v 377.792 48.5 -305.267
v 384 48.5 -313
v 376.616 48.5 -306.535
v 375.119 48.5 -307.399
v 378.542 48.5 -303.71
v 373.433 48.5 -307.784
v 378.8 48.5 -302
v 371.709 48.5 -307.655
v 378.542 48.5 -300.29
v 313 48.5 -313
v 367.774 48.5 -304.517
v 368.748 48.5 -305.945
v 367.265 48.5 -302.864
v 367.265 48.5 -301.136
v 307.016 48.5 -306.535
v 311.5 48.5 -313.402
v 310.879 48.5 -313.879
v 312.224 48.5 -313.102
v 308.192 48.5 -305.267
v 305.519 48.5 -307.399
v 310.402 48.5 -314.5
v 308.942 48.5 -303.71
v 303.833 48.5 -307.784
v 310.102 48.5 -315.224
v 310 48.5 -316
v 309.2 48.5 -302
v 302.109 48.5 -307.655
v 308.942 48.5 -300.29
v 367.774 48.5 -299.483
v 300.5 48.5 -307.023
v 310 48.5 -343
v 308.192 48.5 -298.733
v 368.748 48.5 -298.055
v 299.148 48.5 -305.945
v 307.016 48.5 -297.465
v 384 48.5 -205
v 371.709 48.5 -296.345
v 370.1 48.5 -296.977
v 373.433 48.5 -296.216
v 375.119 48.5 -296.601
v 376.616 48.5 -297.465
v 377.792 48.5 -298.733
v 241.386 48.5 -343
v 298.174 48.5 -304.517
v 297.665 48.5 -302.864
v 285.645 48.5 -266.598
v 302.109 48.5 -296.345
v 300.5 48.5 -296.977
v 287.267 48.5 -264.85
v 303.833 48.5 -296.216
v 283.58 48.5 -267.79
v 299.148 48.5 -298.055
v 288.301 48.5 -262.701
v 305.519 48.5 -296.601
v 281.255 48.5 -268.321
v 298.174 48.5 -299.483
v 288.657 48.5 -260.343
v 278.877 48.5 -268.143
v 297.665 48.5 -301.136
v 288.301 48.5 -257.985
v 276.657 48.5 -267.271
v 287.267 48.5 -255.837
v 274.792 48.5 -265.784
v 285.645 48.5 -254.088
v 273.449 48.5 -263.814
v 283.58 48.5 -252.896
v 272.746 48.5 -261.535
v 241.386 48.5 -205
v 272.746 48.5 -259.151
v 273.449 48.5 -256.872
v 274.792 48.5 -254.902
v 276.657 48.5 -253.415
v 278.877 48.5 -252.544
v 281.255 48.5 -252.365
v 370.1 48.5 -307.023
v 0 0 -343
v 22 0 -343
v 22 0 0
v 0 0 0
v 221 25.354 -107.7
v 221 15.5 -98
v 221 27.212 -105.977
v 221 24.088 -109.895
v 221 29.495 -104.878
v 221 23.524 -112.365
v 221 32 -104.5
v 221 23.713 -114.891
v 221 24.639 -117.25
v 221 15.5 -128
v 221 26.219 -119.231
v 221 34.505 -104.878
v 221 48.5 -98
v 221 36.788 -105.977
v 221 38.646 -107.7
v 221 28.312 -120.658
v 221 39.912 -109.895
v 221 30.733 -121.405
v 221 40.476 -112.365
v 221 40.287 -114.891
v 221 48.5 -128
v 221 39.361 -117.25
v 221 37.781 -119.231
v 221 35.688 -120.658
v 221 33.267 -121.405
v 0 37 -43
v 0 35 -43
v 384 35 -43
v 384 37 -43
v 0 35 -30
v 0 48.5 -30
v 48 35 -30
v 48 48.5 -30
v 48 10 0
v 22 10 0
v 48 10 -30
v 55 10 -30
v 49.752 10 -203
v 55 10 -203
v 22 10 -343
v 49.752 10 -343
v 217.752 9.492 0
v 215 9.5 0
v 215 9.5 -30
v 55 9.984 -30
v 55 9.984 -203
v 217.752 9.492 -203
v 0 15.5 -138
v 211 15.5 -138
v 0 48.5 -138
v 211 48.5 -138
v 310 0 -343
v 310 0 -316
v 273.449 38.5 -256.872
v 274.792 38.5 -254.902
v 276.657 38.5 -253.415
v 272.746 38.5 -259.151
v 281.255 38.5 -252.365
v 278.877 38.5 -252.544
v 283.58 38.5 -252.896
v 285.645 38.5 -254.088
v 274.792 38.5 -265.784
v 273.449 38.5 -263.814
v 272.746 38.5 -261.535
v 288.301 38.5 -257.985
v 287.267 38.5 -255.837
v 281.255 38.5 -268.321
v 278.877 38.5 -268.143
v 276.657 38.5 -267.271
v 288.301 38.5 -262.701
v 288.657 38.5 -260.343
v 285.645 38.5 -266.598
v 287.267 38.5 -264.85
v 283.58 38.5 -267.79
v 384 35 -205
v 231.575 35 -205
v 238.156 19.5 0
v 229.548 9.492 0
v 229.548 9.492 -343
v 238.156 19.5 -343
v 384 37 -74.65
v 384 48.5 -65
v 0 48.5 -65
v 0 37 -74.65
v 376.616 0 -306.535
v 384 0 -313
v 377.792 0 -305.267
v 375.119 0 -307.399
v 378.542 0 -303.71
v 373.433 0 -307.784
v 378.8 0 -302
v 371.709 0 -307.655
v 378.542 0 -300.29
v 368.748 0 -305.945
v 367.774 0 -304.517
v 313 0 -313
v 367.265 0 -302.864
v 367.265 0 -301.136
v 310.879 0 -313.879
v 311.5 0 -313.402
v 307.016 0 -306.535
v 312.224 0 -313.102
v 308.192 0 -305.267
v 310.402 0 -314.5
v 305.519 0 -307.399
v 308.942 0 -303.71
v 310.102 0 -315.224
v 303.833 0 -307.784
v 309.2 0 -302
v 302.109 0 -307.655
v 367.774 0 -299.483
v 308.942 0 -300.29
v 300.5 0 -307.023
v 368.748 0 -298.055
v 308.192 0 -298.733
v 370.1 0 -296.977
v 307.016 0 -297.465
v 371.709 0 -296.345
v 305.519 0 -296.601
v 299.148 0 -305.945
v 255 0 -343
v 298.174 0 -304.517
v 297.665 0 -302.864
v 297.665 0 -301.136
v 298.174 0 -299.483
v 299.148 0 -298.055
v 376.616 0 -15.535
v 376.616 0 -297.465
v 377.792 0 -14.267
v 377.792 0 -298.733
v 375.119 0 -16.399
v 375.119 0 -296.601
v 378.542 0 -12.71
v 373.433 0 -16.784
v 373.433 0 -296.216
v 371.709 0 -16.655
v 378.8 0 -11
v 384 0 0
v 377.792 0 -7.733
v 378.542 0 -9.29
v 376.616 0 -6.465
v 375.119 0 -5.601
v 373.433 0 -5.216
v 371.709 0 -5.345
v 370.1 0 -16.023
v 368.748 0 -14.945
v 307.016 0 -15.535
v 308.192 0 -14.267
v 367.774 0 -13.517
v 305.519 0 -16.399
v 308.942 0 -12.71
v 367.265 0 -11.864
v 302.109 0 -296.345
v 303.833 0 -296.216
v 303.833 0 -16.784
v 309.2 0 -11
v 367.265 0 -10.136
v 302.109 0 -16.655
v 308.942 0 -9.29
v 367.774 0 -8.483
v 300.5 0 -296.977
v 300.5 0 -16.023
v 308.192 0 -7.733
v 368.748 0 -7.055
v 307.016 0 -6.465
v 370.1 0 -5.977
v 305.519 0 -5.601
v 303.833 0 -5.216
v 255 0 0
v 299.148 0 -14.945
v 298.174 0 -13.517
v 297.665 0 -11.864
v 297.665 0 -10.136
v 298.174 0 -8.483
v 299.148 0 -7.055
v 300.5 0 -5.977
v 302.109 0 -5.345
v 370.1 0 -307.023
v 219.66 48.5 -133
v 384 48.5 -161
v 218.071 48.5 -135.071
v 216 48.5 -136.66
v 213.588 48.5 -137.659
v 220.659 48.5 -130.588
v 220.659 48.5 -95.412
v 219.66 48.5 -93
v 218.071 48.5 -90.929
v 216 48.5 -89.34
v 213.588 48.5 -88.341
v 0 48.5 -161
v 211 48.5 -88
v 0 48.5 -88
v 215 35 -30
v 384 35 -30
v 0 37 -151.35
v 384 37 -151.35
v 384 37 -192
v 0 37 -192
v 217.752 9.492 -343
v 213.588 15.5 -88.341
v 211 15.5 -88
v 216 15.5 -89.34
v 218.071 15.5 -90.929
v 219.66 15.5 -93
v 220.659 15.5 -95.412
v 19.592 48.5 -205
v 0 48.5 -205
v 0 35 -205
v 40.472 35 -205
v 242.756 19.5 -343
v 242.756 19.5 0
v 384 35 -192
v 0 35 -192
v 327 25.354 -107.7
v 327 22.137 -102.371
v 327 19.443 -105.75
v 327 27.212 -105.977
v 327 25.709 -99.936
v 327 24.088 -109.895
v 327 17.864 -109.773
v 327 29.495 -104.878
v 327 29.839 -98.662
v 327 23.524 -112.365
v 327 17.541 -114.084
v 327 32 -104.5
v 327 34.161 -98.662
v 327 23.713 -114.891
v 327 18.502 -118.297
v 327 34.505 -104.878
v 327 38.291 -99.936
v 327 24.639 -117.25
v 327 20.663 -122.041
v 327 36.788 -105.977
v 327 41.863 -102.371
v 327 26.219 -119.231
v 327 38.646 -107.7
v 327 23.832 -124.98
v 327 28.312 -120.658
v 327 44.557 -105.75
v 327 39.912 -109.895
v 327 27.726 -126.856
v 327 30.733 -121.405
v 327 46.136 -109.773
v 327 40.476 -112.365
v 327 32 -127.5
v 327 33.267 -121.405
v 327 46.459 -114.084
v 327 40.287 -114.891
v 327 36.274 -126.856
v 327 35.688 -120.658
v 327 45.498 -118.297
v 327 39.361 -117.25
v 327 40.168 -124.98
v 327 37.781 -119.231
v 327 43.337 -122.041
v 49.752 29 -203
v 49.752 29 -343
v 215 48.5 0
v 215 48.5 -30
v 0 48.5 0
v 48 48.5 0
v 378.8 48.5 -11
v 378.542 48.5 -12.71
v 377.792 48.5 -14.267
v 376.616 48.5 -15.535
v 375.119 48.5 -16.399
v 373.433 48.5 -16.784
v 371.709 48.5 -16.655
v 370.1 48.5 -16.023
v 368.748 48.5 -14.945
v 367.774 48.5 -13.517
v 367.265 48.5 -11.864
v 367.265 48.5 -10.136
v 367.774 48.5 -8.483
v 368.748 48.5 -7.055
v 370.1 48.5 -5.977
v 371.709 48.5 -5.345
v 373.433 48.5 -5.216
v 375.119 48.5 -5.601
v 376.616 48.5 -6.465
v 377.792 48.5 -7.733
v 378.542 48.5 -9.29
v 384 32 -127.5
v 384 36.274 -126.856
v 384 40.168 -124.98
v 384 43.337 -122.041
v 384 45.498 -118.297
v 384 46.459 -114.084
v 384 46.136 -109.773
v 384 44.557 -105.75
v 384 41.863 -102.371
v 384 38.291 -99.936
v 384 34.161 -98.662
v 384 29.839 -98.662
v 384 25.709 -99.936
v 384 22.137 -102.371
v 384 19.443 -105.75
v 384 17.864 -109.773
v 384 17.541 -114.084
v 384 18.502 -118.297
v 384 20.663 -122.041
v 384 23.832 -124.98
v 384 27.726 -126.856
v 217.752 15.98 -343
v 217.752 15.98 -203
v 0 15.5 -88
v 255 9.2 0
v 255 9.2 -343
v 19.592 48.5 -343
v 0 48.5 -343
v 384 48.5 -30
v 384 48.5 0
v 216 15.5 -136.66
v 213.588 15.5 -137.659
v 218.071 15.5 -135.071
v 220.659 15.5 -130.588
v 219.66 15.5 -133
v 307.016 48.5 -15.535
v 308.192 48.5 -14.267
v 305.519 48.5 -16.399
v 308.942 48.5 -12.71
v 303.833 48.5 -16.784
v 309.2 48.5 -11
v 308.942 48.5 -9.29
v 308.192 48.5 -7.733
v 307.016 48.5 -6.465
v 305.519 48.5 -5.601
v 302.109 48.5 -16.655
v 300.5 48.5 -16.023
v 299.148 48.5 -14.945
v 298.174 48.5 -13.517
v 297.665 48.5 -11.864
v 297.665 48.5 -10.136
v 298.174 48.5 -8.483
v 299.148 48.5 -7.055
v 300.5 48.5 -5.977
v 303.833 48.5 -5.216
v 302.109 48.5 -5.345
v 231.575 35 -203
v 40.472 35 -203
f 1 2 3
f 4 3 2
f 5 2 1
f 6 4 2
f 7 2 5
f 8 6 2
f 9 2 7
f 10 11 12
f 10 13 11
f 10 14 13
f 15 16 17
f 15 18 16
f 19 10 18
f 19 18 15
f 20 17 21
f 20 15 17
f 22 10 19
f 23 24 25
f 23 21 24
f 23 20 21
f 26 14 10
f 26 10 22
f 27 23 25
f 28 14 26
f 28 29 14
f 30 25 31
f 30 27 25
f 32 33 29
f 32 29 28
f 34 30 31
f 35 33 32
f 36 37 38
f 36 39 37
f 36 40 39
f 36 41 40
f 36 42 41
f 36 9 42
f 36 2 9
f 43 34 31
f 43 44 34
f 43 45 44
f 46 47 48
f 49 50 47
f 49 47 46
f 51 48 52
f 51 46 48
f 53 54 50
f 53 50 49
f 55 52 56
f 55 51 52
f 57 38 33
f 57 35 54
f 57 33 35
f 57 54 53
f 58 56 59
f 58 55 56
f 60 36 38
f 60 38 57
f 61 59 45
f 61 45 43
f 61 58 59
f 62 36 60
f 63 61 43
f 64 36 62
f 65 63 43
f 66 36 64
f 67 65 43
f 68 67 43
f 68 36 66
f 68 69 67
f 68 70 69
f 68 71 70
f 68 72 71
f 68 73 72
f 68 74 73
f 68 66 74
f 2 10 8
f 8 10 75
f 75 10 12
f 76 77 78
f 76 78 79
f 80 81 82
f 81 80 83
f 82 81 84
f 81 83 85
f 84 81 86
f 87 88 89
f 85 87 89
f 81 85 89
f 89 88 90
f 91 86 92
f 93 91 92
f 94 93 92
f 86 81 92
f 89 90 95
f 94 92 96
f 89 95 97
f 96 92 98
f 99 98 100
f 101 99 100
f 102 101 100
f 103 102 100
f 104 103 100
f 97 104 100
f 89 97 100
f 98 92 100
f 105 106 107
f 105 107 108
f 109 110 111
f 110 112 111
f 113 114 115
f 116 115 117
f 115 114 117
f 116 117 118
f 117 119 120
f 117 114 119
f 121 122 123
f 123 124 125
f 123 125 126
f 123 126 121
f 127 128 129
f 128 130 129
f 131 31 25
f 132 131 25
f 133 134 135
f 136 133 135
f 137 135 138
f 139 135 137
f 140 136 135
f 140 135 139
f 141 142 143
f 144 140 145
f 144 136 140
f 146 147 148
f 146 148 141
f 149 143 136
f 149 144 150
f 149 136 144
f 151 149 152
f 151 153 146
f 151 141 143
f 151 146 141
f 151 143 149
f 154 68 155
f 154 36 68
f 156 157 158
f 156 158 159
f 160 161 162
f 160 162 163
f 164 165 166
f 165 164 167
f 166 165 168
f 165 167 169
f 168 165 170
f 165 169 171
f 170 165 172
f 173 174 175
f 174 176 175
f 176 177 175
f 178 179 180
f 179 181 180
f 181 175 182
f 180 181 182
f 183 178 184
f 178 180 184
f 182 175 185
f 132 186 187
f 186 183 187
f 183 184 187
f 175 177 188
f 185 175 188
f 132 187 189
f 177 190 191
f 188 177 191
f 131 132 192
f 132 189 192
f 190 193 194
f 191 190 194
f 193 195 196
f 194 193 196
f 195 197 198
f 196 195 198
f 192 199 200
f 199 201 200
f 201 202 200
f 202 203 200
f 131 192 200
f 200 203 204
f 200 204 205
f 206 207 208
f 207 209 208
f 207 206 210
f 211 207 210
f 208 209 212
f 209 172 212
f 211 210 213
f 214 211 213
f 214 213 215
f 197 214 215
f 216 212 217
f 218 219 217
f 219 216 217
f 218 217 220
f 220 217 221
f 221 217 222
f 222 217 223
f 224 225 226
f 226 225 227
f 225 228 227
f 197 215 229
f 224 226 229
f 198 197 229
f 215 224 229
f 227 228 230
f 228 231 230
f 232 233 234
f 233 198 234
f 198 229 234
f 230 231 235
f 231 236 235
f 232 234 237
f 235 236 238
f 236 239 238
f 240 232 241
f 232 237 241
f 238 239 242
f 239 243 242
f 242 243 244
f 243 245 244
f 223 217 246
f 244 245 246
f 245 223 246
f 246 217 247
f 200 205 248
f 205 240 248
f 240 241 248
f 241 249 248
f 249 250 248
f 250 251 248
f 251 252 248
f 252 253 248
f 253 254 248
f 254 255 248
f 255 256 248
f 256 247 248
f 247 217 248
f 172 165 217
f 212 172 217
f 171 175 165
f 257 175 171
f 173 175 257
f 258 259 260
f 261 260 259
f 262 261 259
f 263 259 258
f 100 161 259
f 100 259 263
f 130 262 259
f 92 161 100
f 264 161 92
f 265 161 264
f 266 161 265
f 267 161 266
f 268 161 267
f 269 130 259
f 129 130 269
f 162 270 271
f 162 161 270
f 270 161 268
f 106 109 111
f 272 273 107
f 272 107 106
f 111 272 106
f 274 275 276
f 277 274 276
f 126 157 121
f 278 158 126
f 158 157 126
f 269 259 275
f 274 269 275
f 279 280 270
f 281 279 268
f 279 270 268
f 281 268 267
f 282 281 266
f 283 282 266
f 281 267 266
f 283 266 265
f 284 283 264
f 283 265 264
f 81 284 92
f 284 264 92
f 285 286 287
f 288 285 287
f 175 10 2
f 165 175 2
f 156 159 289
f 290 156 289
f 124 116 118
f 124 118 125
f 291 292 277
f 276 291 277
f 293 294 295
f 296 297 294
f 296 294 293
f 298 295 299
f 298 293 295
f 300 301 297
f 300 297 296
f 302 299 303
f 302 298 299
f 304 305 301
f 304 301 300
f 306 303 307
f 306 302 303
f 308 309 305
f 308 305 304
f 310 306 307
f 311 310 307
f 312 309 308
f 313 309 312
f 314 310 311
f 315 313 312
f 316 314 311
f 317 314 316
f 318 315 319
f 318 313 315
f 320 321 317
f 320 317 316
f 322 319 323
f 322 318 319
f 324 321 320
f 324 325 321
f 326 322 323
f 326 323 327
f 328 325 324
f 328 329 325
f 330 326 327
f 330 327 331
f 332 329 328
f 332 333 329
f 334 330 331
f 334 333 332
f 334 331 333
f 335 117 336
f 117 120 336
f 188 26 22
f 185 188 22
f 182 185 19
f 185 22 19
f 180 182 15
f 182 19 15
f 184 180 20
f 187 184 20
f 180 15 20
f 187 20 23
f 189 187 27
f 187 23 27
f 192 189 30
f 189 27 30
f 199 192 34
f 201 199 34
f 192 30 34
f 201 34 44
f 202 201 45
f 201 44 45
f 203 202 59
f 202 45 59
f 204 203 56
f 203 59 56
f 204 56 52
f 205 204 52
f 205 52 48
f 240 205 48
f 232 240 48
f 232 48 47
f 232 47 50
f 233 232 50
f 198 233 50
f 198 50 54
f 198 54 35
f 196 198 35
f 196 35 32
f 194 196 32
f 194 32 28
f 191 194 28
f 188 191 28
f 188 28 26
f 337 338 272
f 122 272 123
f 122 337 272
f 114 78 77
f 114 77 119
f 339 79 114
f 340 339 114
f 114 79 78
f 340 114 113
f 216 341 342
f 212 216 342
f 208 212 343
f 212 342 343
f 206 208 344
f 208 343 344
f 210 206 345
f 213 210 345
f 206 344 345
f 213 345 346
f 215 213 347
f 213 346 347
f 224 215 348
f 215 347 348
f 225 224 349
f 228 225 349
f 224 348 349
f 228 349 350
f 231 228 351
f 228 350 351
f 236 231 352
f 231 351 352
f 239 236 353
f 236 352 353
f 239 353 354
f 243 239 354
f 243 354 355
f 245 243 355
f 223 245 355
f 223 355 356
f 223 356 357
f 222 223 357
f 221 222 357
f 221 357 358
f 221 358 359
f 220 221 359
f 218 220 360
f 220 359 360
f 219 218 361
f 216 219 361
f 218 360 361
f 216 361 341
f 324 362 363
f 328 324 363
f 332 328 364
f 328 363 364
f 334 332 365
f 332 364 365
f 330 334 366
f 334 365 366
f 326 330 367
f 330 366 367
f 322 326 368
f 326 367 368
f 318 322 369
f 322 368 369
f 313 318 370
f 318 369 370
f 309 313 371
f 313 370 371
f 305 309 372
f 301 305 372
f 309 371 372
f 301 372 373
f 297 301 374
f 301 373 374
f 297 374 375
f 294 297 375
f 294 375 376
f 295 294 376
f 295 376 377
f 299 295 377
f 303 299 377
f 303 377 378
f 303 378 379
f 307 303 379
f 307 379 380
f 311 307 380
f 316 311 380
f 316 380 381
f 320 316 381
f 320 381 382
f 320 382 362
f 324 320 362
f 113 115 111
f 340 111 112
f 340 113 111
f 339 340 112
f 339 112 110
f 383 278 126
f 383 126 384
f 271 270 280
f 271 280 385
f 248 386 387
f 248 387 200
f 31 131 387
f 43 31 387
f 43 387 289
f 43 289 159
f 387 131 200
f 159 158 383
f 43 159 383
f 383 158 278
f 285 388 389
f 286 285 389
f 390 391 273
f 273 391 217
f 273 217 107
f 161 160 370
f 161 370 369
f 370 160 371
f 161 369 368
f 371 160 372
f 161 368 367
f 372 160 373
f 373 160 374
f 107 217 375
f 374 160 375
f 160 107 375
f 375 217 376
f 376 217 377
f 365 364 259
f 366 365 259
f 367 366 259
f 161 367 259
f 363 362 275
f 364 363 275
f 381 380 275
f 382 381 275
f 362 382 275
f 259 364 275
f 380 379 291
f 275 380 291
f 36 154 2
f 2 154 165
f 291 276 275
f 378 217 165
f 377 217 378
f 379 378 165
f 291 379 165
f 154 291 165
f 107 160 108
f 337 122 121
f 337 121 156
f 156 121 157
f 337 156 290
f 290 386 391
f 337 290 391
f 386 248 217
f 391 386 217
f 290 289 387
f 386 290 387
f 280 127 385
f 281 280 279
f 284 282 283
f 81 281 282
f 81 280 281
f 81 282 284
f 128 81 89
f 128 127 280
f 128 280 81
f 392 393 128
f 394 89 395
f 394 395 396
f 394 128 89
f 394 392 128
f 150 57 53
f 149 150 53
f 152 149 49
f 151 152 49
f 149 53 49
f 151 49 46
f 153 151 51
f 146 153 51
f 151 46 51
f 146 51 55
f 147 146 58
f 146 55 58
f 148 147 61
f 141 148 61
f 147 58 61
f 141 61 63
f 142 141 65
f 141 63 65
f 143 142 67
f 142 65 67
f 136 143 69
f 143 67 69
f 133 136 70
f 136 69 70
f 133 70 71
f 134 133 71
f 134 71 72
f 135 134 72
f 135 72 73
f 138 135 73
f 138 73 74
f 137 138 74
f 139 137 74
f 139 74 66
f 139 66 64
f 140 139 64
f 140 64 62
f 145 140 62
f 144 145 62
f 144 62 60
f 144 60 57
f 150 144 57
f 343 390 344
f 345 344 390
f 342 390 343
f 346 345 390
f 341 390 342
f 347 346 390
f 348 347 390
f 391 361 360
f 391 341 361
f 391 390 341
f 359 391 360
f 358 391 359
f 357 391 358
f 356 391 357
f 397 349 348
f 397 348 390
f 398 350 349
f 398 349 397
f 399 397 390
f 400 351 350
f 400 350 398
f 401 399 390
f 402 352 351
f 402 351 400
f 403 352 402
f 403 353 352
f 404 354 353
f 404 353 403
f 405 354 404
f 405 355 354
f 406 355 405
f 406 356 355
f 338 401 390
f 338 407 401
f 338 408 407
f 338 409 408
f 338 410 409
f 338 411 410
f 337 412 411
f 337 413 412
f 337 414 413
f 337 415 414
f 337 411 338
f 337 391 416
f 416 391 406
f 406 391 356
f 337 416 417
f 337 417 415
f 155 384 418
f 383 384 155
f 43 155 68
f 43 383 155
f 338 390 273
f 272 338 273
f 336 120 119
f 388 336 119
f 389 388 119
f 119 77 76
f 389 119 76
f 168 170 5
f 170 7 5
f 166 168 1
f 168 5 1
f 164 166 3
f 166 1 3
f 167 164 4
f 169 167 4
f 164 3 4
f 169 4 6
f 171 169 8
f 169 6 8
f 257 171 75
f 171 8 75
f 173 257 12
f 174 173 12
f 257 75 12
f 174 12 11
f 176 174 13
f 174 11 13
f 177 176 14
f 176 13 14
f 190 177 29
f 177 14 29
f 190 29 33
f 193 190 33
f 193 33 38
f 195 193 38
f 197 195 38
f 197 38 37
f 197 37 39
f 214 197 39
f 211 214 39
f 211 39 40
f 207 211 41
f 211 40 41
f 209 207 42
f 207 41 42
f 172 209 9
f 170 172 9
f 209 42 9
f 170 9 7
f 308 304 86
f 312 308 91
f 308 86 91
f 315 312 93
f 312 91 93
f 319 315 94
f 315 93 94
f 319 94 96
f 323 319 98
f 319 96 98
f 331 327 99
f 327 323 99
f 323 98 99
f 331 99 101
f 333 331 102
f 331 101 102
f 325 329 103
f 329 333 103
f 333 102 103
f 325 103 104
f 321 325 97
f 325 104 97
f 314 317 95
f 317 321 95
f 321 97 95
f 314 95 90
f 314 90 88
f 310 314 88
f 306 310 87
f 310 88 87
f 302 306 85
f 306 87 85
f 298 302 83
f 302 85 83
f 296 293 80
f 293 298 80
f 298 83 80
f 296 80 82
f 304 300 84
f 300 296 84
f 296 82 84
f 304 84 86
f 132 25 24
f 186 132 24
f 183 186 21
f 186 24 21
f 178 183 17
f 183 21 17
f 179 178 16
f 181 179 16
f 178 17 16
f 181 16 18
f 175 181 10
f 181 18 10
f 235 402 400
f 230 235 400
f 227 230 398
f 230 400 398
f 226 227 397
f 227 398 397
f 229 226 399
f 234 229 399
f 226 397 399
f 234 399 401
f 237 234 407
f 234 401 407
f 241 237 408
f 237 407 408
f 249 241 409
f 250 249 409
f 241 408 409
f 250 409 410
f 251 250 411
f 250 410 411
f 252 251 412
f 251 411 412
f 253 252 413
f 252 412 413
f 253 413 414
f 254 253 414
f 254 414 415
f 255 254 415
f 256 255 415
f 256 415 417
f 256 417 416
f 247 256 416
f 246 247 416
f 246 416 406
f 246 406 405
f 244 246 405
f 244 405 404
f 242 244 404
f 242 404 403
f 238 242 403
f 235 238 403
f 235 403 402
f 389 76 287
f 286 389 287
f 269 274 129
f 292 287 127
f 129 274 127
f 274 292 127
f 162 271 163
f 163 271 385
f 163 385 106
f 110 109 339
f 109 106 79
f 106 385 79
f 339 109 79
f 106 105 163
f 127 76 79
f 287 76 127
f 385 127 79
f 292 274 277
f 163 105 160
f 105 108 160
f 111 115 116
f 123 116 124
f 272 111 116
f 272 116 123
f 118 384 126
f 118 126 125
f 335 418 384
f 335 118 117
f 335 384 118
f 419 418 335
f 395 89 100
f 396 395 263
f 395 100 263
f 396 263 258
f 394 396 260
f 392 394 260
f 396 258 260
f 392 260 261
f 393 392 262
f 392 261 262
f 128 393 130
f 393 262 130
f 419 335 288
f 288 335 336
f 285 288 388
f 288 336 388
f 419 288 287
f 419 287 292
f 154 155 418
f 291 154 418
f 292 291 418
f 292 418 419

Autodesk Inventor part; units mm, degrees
ref_plane "YZ Plane" through (0, 0, 0) normal (1, 0, 0) x (0, 1, 0)
ref_plane "XZ Plane" through (0, 0, 0) normal (0, 1, 0) x (-1, 0, 0)
ref_plane "XY Plane" through (0, 0, 0) normal (0, 0, 1) x (1, 0, 0)
sketch "Sketch1" plane through (0, 0, 0) normal (0, 1, 0) x (-1, 0, 0)
  line L0 (0, 0) -> (-384, 0)
  line L1 (-384, 0) -> (-384, -343)
  line L2 (-384, -343) -> (0, -343)
  line L3 (0, -343) -> (0, 0)
  dimension "d0" = 384
  dimension "d1" = 343
extrude "Extrusion1" add sketch "Sketch1" along normal blind 48.5
sketch "Sketch3" plane through (384, 0, 0) normal (1, 0, 0) x (0, 0, -1)
  line L0 (0, 0) -> (343, 0) projected
  line L1 (0, 0) -> (0, 48.5) projected
  line L2 (343, 0) -> (343, 48.5) projected
  line L3 (30, 48.5) -> (65, 48.5)
  line L4 (30, 48.5) -> (30, 37)
  line L5 (65, 48.5) -> (74.6496, 37)
  line L6 (43, 37) -> (74.6496, 37)
  line L7 (30, 37) -> (30, 35)
  line L8 (30, 35) -> (43, 35)
  line L9 (43, 35) -> (43, 37)
  dimension "d23" = 35
  dimension "d37" = 2
  dimension "d38" = 13
extrude "Extrusion2" cut sketch "Sketch3" against normal through all
sketch "Sketch7" plane through (384, 0, 0) normal (1, 0, 0) x (0, 0, -1)
  line L0 (65, 48.5) -> (343, 48.5) projected
  line L1 (65, 48.5) -> (161, 48.5)
  line L2 (161, 48.5) -> (174.2196, 48.5) construction
  line L3 (161, 48.5) -> (205, 48.5)
  line L4 (0, 0) -> (343, 0) projected
  line L5 (151.3504, 37) -> (192, 37)
  line L6 (205, 37) -> (205, 48.5)
  line L7 (161, 48.5) -> (151.3504, 37)
  line L8 (161, 48.5) -> (183.0653, 48.5) construction
  line L9 (205, 37) -> (205, 35)
  line L10 (205, 35) -> (192, 35)
  line L11 (192, 35) -> (192, 37)
  dimension "d27" = 96
  dimension "d29" = 44
  dimension "d32" = 130
extrude "Extrusion3" cut sketch "Sketch7" against normal through all
sketch "Sketch8" plane through (0, 48.5, 0) normal (0, 1, 0) x (1, 0, 0)
  line L0 (310, 343) -> (310, 316)
  line L1 (313, 313) -> (384, 313)
  line L2 (384, 0) -> (384, 343) projected
  line L3 (384, 313) -> (384, 343)
  line L4 (384, 343) -> (310, 343)
  line L5 (384, 343) -> (0, 343) projected
  arc A0 (310, 316) -> (313, 313) centre (313, 316) ccw
  point P0 (0, 0)
  point P1 (310, 313)
  dimension "d43" = 30
  dimension "d46" = 3
extrude "Extrusion4" cut sketch "Sketch8" against normal through all
sketch "Sketch12" plane through (0, 48.5, 0) normal (0, 1, 0) x (1, 0, 0)
  line L0 (221, 113) -> (221, 128)
  line L1 (211, 88) -> (0, 88)
  line L2 (211, 138) -> (0, 138)
  arc A0 (211, 88) -> (221, 98) centre (211, 98) ccw
  arc A1 (221, 128) -> (211, 138) centre (211, 128) ccw
  line L3 (221, 98) -> (221, 113)
  line L4 (0, 88) -> (0, 138)
  point P0 (384, 161)
  point P1 (221, 88)
  dimension "d72" = 10
extrude "Extrusion8" cut sketch "Sketch12" against normal blind 33
sketch "Sketch28" plane through (0, 48.5, 0) normal (0, 1, 0) x (1, 0, 0)
  circle A0 centre (373, 302) radius 5.8
  circle A1 centre (303.4, 302) radius 5.8
  circle A2 centre (373, 11) radius 5.8
  circle A3 centre (303.4, 11) radius 5.8
  point P0 (0, 0)
  point P1 (384, 313)
  point P2 (384, 0)
  dimension "d146" = 11.6
  dimension "d149" = 11.6
  dimension "d152" = 11.6
  dimension "d155" = 11.6
extrude "Extrusion19" cut sketch "Sketch28" against normal through all
sketch "Sketch30" plane through (0, 0, 0) normal (0, 0, 1) x (1, 0, 0)
  line L0 (48, 48.5) -> (215, 48.5)
  line L1 (215, 48.5) -> (215, 0)
  line L2 (215, 0) -> (48, 0)
  line L3 (48, 0) -> (48, 48.5)
  line L4 (0, 0) -> (0, 48.5) projected
  dimension "d255" = 48
  dimension "d256" = 167
extrude "Extrusion21" cut sketch "Sketch30" against normal up to surface (30 mm away)
sketch "Sketch32" plane through (0, 48.5, 0) normal (0, 1, 0) x (1, 0, 0)
  line L0 (275, 266) -> (283, 266) construction
  circle A0 centre (280.6569, 260.3431) radius 8
  point P0 (0, 0)
  point P1 (255, 343)
  dimension "d168" = 16
extrude "Extrusion22" cut sketch "Sketch32" against normal blind 10
sketch "Sketch36" plane through (0, 0, -343) normal (0, 0, -1) x (-1, 0, 0)
  line L0 (-255, 0) -> (-243.6863, 11.3137)
  line L1 (-255, 0) -> (-239, 0) construction
  line L2 (-243.6863, 11.3137) -> (-239.0863, 11.3137)
  line L3 (-239.0863, 11.3137) -> (-229.7525, 1.9799)
  line L4 (-239.0863, 11.3137) -> (-225.8863, 11.3137) construction
  line L5 (-229.7525, 1.9799) -> (-217.7525, 1.9799)
  line L6 (-22, 0) -> (-22, 10)
  line L7 (-22, 10) -> (-55, 10)
  line L8 (-217.7525, 1.9799) -> (-217.7525, 0)
  line L9 (-55, 10) -> (-55, 0)
  line L10 (-255, 0) -> (-217.7525, 0)
  line L11 (-310, 0) -> (0, 0) projected
  line L12 (-55, 0) -> (-22, 0)
  dimension "d209" = 16
  dimension "d210" = 45
  dimension "d211" = 4.6
  dimension "d214" = 13.2
  dimension "d215" = 45
  dimension "d216" = 12
  dimension "d224" = 22
  dimension "d225" = 10
extrude "Extrusion23" cut sketch "Sketch36" against normal through all
sketch "Sketch37" plane through (0, 0, -343) normal (0, 0, -1) x (-1, 0, 0)
  line L0 (-217.7525, 1.9799) -> (-217.7525, 15.9799)
  line L1 (-217.7525, 15.9799) -> (-241.3863, 48.5)
  line L2 (-241.3863, 48.5) -> (-19.5919, 48.5)
  line L3 (-211, 48.5) -> (0, 48.5) projected
  line L4 (-48, 10) -> (-55, 10) projected
  line L5 (-217.7525, 0) -> (-217.7525, 1.9799) projected
  line L6 (-217.7525, 1.9799) -> (-217.7525, 0)
  line L7 (-215, 0) -> (-55, 0) projected
  line L8 (-217.7525, 0) -> (-55, 0)
  line L9 (-55, 10) -> (-55, 0) projected
  line L10 (-55, 0) -> (-55, 10)
  line L11 (-217.7525, 15.9799) -> (-49.7525, 15.9799) construction
  line L12 (-55, 10) -> (-49.7525, 10)
  line L13 (-49.7525, 10) -> (-49.7525, 29)
  line L14 (-49.7525, 29) -> (-19.5919, 48.5)
  line L15 (0, 48.5) -> (-48, 48.5) projected
  point P0 (0, 0)
  point P1 (-23, 48.5)
  dimension "d229" = 14
  dimension "d232" = 19
extrude "Extrusion24" cut sketch "Sketch37" against normal blind 140
sketch "Sketch38" plane through (0, 0, -203) normal (0, 0, -1) x (-1, 0, 0)
  line L0 (-49.7525, 29) -> (-49.7525, 10) projected
  line L1 (-55, 9.9841) -> (-217.7525, 9.4921)
  line L2 (-217.7525, 1.9799) -> (-217.7525, 15.9799) projected
  line L3 (-217.7525, 0) -> (-217.7525, 1.9799) projected
  line L4 (-217.7525, 9.4921) -> (-217.7525, 0)
  line L5 (-215, 0) -> (-55, 0) projected
  line L6 (-217.7525, 0) -> (-55, 0)
  line L7 (-55, 10) -> (-55, 0) projected
  line L8 (-55, 0) -> (-55, 10)
  line L9 (-55, 10) -> (-55, 0)
  point P0 (0, 0)
extrude "Extrusion25" cut sketch "Sketch38" against normal through all
sketch "Sketch40" plane through (0, 0, -343) normal (0, 0, -1) x (-1, 0, 0)
  line L0 (-229.5482, 9.4921) -> (-238.1559, 19.4995)
  line L1 (-229.5482, 9.4921) -> (-216.3482, 9.4921) construction
  line L2 (-238.1559, 19.4995) -> (-242.7559, 19.4995)
  line L3 (-242.7559, 19.4995) -> (-255, 9.1999)
  line L4 (-242.7559, 19.4995) -> (-226.7559, 19.4995) construction
  line L5 (-243.6863, 11.3137) -> (-255, 0) projected
  line L6 (-255, 9.1999) -> (-255, 0)
  line L7 (-229.5482, 9.4921) -> (-217.7525, 9.4921)
  line L8 (-217.7525, 9.4921) -> (-217.7525, 1.9799) projected
  line L9 (-217.7525, 9.4921) -> (-217.7525, 1.9799)
  line L10 (-217.7525, 1.9799) -> (-217.7525, 9.4921)
  line L11 (-217.7525, 1.9799) -> (-229.7525, 1.9799)
  line L12 (-229.7525, 1.9799) -> (-239.0863, 11.3137) projected
  line L13 (-229.7525, 1.9799) -> (-239.0863, 11.3137)
  line L14 (-239.0863, 11.3137) -> (-243.6863, 11.3137)
  line L15 (-255, 0) -> (-243.6863, 11.3137)
  dimension "d240" = 13.2
  dimension "d242" = 4.6
  dimension "d243" = 16
extrude "Extrusion26" cut sketch "Sketch40" against normal through all
sketch "Sketch41" plane through (221, 48.5, -128) normal (-1, 0, 0) x (0, 0, 1)
  circle A0 centre (15, -16.5) radius 8.5
  point P0 (128, -48.5)
  dimension "d247" = 17
extrude "Extrusion27" cut sketch "Sketch41" against normal through all
sketch "Sketch42" plane through (384, 0, 0) normal (1, 0, 0) x (0, 0, -1)
  circle A0 centre (113, 32) radius 8.5 projected
  circle A1 centre (113, 32) radius 14.5
  point P0 (0, 0)
  dimension "d250" = 29
extrude "Extrusion28" cut sketch "Sketch42" against normal blind 57
properties part number "saddle" material "Iron, Cast"
